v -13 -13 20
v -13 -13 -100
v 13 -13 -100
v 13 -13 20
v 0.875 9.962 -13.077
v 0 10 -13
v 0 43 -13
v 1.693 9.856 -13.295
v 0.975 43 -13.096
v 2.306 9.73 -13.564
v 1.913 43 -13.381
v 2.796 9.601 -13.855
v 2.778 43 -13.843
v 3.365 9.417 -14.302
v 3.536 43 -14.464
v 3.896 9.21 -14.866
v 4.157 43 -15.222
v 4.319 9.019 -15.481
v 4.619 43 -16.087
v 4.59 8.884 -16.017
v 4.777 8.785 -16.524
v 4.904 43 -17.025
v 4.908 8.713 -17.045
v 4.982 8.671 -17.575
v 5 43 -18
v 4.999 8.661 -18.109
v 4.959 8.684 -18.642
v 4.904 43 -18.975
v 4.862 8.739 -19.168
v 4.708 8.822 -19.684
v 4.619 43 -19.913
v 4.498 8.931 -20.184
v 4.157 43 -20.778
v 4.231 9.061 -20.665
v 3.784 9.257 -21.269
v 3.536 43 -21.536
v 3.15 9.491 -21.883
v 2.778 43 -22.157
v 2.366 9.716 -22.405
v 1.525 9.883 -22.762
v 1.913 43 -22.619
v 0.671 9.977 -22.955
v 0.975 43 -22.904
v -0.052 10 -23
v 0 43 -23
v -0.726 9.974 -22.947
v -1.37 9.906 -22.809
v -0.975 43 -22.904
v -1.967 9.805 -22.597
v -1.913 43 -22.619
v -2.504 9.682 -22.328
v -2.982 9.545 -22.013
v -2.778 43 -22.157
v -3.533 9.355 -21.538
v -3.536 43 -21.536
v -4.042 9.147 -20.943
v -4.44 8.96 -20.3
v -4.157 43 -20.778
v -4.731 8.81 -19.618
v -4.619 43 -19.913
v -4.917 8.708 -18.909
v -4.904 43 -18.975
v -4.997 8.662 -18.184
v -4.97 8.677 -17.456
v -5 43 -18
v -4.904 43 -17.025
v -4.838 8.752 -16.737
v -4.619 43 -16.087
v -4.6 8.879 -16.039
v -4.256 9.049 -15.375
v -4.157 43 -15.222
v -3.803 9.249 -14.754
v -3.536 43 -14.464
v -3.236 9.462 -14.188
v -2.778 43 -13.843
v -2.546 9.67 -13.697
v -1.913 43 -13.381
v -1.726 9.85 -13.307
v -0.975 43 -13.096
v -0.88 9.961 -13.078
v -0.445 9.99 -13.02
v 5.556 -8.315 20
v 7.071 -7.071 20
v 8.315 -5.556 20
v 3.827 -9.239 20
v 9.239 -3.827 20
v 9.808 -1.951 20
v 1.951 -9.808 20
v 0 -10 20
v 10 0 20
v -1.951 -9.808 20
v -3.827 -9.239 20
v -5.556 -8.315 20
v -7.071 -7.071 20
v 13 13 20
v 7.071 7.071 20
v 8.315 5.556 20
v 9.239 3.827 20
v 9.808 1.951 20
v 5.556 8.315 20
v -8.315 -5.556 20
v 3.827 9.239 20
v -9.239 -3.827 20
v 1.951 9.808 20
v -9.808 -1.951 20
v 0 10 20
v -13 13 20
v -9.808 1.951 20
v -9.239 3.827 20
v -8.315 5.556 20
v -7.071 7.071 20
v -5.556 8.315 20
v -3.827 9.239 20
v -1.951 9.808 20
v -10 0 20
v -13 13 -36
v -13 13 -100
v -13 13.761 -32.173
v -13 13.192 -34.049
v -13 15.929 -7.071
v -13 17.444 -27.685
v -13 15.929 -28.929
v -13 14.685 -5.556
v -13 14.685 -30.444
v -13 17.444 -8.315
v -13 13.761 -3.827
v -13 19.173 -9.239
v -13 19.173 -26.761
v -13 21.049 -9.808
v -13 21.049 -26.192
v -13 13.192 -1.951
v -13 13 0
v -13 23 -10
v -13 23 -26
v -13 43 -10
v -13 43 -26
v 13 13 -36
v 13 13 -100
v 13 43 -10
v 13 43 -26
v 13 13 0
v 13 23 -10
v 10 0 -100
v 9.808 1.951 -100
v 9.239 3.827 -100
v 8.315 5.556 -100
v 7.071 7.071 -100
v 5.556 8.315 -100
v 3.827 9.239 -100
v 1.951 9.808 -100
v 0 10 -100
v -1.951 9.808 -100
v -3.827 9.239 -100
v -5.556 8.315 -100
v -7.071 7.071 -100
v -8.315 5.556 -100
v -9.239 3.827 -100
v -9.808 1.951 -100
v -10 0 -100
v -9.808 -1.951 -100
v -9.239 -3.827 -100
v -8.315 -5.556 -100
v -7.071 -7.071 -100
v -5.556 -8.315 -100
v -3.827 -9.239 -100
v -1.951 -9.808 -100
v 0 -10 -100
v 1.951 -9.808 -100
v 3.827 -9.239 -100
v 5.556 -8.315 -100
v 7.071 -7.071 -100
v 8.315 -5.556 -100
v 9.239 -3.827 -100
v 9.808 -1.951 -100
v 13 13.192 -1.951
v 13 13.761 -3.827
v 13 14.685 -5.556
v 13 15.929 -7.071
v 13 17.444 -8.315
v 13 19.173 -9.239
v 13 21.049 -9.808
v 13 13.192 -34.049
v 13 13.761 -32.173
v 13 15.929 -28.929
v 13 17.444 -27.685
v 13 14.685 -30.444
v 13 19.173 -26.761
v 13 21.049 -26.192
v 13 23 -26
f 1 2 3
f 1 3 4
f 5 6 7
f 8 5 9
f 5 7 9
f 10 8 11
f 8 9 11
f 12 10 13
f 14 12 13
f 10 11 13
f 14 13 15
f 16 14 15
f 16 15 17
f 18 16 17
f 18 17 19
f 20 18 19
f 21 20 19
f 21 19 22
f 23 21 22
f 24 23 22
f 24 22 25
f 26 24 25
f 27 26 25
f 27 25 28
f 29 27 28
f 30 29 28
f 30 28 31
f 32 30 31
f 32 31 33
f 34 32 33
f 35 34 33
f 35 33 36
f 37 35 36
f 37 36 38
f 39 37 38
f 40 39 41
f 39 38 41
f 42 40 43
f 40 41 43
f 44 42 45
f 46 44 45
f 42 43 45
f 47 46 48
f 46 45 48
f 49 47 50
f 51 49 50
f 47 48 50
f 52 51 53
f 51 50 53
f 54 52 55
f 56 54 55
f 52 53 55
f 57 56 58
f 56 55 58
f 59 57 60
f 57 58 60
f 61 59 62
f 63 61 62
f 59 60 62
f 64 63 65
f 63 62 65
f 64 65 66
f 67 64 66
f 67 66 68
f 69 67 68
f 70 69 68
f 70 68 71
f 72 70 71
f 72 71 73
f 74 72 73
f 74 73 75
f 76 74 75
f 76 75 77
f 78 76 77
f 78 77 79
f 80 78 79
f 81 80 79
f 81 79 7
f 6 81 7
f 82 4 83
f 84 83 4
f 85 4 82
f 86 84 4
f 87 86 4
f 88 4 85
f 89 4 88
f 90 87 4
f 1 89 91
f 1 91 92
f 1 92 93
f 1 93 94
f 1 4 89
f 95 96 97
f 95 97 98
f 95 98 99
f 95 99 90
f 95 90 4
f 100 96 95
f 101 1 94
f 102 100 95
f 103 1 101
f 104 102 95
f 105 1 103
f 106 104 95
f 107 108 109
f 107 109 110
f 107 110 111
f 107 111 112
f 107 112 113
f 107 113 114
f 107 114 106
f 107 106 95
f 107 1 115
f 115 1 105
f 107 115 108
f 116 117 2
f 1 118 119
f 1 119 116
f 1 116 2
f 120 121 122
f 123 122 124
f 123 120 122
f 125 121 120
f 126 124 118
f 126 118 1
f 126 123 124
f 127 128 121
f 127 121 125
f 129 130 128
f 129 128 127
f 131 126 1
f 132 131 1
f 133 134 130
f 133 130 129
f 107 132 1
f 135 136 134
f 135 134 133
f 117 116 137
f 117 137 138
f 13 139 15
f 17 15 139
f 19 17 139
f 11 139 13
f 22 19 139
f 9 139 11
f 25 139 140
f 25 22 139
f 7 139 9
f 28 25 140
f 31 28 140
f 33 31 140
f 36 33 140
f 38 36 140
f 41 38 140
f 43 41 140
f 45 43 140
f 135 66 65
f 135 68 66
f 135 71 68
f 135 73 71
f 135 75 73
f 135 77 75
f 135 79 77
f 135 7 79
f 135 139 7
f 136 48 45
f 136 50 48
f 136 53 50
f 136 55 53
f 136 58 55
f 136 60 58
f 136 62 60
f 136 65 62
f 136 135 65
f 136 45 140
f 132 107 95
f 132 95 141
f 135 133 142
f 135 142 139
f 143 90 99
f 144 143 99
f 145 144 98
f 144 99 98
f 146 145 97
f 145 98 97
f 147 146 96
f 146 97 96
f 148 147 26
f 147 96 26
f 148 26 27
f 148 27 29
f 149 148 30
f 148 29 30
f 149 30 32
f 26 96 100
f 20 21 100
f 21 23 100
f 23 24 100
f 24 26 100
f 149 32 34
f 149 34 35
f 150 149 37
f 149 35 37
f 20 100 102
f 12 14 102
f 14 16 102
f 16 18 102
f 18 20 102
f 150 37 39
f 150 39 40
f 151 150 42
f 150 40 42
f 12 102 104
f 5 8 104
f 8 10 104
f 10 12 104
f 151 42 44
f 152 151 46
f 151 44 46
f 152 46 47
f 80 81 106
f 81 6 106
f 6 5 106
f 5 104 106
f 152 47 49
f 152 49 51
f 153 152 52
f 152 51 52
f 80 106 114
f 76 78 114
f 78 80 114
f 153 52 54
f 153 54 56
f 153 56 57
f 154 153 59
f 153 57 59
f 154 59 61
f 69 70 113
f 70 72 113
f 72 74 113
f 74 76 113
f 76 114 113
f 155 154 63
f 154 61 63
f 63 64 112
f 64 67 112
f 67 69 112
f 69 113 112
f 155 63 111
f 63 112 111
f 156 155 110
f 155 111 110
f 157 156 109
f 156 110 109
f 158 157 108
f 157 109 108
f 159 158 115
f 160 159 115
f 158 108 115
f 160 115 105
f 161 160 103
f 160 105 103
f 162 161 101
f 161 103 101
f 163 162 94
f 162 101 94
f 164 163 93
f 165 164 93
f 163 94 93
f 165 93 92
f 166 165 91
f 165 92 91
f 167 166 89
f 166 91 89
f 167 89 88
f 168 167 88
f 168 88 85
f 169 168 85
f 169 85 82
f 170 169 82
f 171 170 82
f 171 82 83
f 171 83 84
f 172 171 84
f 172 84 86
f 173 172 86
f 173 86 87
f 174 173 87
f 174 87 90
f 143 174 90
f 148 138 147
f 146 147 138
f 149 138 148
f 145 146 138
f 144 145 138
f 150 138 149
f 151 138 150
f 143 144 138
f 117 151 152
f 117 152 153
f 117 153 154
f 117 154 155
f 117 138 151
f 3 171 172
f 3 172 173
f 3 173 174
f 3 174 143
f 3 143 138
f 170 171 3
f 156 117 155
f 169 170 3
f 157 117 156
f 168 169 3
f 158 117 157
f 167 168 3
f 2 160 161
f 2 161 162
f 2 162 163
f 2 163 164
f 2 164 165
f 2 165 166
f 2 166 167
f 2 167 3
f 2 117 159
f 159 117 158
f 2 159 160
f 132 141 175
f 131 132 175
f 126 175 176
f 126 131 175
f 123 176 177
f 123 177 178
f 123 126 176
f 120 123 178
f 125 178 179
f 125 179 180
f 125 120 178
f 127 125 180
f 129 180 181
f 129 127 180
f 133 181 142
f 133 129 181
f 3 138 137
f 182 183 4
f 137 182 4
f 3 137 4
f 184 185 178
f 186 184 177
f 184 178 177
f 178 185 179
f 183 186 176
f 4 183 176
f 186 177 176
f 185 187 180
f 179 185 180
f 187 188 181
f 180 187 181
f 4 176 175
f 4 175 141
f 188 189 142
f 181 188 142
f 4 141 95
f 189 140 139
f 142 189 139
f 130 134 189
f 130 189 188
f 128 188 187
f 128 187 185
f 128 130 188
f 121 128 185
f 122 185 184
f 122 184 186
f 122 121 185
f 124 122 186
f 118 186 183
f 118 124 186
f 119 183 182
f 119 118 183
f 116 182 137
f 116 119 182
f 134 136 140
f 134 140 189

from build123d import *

# Parameters (mm, degrees)
BOSS_EXTRUDE1_DEPTH            = 13
BOSS_EXTRUDE1_DEPTH_BACK       = 13
CUT_EXTRUDE1_REACH             = 111.627
SKETCH1_R                      = 10
CUT_EXTRUDE1_DIRECTION_2_REACH = 111.627
CUT_EXTRUDE2_REACH             = 117.347
CUT_EXTRUDE2_END_RADIUS        = 10
SKETCH3_R                      = 5


with BuildPart() as part:
    # Sketch2 → Boss-Extrude1 (new, two sides: drawn at the far end of the back side and taken through both)
    with BuildSketch(Plane(origin=(0, 0, 0), x_dir=(0, 0, -1), z_dir=(1, 0, 0)).offset(-BOSS_EXTRUDE1_DEPTH_BACK)):
        with BuildLine():
            Line((36, 13), (100, 13))
            Line((100, 13), (100, -13))
            Line((100, -13), (0, -13))
            Line((0, -13), (-20, -13))
            Line((-20, -13), (-20, 13))
            Line((-20, 13), (0, 13))
            ThreePointArc((0, 13), (7.071067812, 15.928932188), (10, 23))
            Line((10, 23), (10, 43))
            Line((10, 43), (26, 43))
            Line((26, 43), (26, 23))
            ThreePointArc((26, 23), (28.928932188, 15.928932188), (36, 13))
        make_face()
    extrude(amount=BOSS_EXTRUDE1_DEPTH + BOSS_EXTRUDE1_DEPTH_BACK)

    # Cut-Extrude1: up to this face of the body (flat: up to its plane)
    cut_extrude1_end = Plane(part.part.faces().sort_by_distance((0, 0, -100))[0])
    # Sketch1 → Cut-Extrude1 (cut, up to the picked face)
    with BuildSketch(Plane.XY, mode=Mode.PRIVATE) as cut_extrude1_sk1:
        Circle(SKETCH1_R)
    cut_extrude1_tool1 = split(extrude(cut_extrude1_sk1.sketch, amount=-CUT_EXTRUDE1_REACH, mode=Mode.PRIVATE), bisect_by=cut_extrude1_end, keep=Keep.BOTH, mode=Mode.PRIVATE)
    add(cut_extrude1_tool1.solids().sort_by(Axis((0, 0, 0), (0, 0, -1)))[0], mode=Mode.SUBTRACT)

    # Cut-Extrude1 direction 2: up to this face of the body (flat: up to its plane)
    cut_extrude1_direction_2_end = Plane(part.part.faces().sort_by_distance((0, 0, 20))[0])
    # Sketch1 → Cut-Extrude1 direction 2 (cut, up to the picked face)
    with BuildSketch(Plane.XY, mode=Mode.PRIVATE) as cut_extrude1_direction_2_sk1:
        Circle(SKETCH1_R)
    cut_extrude1_direction_2_tool1 = split(extrude(cut_extrude1_direction_2_sk1.sketch, amount=CUT_EXTRUDE1_DIRECTION_2_REACH, mode=Mode.PRIVATE), bisect_by=cut_extrude1_direction_2_end, keep=Keep.BOTH, mode=Mode.PRIVATE)
    add(cut_extrude1_direction_2_tool1.solids().sort_by(Axis((0, 0, 0), (0, 0, 1)))[0], mode=Mode.SUBTRACT)

    # Cut-Extrude2: up to this cylinder (the profile starts outside it)
    cut_extrude2_end = Plane(origin=(0, 0, -18), z_dir=(0, 0, 1)) * Cylinder(CUT_EXTRUDE2_END_RADIUS, 255.694, mode=Mode.PRIVATE)
    # Sketch3 → Cut-Extrude2 (cut, up to the surface)
    with BuildSketch(Plane(origin=(0, 43, 0), x_dir=(1, 0, 0), z_dir=(0, 1, 0)), mode=Mode.PRIVATE) as cut_extrude2_sk1:
        with Locations(Location((0, 18, 0), (0, 0, 270))):
            Circle(SKETCH3_R)
    cut_extrude2_tool1 = extrude(cut_extrude2_sk1.sketch, amount=-CUT_EXTRUDE2_REACH, mode=Mode.PRIVATE) - cut_extrude2_end
    add(cut_extrude2_tool1.solids().sort_by_distance((0, 43, -18))[0], mode=Mode.SUBTRACT)


solid = part.part
